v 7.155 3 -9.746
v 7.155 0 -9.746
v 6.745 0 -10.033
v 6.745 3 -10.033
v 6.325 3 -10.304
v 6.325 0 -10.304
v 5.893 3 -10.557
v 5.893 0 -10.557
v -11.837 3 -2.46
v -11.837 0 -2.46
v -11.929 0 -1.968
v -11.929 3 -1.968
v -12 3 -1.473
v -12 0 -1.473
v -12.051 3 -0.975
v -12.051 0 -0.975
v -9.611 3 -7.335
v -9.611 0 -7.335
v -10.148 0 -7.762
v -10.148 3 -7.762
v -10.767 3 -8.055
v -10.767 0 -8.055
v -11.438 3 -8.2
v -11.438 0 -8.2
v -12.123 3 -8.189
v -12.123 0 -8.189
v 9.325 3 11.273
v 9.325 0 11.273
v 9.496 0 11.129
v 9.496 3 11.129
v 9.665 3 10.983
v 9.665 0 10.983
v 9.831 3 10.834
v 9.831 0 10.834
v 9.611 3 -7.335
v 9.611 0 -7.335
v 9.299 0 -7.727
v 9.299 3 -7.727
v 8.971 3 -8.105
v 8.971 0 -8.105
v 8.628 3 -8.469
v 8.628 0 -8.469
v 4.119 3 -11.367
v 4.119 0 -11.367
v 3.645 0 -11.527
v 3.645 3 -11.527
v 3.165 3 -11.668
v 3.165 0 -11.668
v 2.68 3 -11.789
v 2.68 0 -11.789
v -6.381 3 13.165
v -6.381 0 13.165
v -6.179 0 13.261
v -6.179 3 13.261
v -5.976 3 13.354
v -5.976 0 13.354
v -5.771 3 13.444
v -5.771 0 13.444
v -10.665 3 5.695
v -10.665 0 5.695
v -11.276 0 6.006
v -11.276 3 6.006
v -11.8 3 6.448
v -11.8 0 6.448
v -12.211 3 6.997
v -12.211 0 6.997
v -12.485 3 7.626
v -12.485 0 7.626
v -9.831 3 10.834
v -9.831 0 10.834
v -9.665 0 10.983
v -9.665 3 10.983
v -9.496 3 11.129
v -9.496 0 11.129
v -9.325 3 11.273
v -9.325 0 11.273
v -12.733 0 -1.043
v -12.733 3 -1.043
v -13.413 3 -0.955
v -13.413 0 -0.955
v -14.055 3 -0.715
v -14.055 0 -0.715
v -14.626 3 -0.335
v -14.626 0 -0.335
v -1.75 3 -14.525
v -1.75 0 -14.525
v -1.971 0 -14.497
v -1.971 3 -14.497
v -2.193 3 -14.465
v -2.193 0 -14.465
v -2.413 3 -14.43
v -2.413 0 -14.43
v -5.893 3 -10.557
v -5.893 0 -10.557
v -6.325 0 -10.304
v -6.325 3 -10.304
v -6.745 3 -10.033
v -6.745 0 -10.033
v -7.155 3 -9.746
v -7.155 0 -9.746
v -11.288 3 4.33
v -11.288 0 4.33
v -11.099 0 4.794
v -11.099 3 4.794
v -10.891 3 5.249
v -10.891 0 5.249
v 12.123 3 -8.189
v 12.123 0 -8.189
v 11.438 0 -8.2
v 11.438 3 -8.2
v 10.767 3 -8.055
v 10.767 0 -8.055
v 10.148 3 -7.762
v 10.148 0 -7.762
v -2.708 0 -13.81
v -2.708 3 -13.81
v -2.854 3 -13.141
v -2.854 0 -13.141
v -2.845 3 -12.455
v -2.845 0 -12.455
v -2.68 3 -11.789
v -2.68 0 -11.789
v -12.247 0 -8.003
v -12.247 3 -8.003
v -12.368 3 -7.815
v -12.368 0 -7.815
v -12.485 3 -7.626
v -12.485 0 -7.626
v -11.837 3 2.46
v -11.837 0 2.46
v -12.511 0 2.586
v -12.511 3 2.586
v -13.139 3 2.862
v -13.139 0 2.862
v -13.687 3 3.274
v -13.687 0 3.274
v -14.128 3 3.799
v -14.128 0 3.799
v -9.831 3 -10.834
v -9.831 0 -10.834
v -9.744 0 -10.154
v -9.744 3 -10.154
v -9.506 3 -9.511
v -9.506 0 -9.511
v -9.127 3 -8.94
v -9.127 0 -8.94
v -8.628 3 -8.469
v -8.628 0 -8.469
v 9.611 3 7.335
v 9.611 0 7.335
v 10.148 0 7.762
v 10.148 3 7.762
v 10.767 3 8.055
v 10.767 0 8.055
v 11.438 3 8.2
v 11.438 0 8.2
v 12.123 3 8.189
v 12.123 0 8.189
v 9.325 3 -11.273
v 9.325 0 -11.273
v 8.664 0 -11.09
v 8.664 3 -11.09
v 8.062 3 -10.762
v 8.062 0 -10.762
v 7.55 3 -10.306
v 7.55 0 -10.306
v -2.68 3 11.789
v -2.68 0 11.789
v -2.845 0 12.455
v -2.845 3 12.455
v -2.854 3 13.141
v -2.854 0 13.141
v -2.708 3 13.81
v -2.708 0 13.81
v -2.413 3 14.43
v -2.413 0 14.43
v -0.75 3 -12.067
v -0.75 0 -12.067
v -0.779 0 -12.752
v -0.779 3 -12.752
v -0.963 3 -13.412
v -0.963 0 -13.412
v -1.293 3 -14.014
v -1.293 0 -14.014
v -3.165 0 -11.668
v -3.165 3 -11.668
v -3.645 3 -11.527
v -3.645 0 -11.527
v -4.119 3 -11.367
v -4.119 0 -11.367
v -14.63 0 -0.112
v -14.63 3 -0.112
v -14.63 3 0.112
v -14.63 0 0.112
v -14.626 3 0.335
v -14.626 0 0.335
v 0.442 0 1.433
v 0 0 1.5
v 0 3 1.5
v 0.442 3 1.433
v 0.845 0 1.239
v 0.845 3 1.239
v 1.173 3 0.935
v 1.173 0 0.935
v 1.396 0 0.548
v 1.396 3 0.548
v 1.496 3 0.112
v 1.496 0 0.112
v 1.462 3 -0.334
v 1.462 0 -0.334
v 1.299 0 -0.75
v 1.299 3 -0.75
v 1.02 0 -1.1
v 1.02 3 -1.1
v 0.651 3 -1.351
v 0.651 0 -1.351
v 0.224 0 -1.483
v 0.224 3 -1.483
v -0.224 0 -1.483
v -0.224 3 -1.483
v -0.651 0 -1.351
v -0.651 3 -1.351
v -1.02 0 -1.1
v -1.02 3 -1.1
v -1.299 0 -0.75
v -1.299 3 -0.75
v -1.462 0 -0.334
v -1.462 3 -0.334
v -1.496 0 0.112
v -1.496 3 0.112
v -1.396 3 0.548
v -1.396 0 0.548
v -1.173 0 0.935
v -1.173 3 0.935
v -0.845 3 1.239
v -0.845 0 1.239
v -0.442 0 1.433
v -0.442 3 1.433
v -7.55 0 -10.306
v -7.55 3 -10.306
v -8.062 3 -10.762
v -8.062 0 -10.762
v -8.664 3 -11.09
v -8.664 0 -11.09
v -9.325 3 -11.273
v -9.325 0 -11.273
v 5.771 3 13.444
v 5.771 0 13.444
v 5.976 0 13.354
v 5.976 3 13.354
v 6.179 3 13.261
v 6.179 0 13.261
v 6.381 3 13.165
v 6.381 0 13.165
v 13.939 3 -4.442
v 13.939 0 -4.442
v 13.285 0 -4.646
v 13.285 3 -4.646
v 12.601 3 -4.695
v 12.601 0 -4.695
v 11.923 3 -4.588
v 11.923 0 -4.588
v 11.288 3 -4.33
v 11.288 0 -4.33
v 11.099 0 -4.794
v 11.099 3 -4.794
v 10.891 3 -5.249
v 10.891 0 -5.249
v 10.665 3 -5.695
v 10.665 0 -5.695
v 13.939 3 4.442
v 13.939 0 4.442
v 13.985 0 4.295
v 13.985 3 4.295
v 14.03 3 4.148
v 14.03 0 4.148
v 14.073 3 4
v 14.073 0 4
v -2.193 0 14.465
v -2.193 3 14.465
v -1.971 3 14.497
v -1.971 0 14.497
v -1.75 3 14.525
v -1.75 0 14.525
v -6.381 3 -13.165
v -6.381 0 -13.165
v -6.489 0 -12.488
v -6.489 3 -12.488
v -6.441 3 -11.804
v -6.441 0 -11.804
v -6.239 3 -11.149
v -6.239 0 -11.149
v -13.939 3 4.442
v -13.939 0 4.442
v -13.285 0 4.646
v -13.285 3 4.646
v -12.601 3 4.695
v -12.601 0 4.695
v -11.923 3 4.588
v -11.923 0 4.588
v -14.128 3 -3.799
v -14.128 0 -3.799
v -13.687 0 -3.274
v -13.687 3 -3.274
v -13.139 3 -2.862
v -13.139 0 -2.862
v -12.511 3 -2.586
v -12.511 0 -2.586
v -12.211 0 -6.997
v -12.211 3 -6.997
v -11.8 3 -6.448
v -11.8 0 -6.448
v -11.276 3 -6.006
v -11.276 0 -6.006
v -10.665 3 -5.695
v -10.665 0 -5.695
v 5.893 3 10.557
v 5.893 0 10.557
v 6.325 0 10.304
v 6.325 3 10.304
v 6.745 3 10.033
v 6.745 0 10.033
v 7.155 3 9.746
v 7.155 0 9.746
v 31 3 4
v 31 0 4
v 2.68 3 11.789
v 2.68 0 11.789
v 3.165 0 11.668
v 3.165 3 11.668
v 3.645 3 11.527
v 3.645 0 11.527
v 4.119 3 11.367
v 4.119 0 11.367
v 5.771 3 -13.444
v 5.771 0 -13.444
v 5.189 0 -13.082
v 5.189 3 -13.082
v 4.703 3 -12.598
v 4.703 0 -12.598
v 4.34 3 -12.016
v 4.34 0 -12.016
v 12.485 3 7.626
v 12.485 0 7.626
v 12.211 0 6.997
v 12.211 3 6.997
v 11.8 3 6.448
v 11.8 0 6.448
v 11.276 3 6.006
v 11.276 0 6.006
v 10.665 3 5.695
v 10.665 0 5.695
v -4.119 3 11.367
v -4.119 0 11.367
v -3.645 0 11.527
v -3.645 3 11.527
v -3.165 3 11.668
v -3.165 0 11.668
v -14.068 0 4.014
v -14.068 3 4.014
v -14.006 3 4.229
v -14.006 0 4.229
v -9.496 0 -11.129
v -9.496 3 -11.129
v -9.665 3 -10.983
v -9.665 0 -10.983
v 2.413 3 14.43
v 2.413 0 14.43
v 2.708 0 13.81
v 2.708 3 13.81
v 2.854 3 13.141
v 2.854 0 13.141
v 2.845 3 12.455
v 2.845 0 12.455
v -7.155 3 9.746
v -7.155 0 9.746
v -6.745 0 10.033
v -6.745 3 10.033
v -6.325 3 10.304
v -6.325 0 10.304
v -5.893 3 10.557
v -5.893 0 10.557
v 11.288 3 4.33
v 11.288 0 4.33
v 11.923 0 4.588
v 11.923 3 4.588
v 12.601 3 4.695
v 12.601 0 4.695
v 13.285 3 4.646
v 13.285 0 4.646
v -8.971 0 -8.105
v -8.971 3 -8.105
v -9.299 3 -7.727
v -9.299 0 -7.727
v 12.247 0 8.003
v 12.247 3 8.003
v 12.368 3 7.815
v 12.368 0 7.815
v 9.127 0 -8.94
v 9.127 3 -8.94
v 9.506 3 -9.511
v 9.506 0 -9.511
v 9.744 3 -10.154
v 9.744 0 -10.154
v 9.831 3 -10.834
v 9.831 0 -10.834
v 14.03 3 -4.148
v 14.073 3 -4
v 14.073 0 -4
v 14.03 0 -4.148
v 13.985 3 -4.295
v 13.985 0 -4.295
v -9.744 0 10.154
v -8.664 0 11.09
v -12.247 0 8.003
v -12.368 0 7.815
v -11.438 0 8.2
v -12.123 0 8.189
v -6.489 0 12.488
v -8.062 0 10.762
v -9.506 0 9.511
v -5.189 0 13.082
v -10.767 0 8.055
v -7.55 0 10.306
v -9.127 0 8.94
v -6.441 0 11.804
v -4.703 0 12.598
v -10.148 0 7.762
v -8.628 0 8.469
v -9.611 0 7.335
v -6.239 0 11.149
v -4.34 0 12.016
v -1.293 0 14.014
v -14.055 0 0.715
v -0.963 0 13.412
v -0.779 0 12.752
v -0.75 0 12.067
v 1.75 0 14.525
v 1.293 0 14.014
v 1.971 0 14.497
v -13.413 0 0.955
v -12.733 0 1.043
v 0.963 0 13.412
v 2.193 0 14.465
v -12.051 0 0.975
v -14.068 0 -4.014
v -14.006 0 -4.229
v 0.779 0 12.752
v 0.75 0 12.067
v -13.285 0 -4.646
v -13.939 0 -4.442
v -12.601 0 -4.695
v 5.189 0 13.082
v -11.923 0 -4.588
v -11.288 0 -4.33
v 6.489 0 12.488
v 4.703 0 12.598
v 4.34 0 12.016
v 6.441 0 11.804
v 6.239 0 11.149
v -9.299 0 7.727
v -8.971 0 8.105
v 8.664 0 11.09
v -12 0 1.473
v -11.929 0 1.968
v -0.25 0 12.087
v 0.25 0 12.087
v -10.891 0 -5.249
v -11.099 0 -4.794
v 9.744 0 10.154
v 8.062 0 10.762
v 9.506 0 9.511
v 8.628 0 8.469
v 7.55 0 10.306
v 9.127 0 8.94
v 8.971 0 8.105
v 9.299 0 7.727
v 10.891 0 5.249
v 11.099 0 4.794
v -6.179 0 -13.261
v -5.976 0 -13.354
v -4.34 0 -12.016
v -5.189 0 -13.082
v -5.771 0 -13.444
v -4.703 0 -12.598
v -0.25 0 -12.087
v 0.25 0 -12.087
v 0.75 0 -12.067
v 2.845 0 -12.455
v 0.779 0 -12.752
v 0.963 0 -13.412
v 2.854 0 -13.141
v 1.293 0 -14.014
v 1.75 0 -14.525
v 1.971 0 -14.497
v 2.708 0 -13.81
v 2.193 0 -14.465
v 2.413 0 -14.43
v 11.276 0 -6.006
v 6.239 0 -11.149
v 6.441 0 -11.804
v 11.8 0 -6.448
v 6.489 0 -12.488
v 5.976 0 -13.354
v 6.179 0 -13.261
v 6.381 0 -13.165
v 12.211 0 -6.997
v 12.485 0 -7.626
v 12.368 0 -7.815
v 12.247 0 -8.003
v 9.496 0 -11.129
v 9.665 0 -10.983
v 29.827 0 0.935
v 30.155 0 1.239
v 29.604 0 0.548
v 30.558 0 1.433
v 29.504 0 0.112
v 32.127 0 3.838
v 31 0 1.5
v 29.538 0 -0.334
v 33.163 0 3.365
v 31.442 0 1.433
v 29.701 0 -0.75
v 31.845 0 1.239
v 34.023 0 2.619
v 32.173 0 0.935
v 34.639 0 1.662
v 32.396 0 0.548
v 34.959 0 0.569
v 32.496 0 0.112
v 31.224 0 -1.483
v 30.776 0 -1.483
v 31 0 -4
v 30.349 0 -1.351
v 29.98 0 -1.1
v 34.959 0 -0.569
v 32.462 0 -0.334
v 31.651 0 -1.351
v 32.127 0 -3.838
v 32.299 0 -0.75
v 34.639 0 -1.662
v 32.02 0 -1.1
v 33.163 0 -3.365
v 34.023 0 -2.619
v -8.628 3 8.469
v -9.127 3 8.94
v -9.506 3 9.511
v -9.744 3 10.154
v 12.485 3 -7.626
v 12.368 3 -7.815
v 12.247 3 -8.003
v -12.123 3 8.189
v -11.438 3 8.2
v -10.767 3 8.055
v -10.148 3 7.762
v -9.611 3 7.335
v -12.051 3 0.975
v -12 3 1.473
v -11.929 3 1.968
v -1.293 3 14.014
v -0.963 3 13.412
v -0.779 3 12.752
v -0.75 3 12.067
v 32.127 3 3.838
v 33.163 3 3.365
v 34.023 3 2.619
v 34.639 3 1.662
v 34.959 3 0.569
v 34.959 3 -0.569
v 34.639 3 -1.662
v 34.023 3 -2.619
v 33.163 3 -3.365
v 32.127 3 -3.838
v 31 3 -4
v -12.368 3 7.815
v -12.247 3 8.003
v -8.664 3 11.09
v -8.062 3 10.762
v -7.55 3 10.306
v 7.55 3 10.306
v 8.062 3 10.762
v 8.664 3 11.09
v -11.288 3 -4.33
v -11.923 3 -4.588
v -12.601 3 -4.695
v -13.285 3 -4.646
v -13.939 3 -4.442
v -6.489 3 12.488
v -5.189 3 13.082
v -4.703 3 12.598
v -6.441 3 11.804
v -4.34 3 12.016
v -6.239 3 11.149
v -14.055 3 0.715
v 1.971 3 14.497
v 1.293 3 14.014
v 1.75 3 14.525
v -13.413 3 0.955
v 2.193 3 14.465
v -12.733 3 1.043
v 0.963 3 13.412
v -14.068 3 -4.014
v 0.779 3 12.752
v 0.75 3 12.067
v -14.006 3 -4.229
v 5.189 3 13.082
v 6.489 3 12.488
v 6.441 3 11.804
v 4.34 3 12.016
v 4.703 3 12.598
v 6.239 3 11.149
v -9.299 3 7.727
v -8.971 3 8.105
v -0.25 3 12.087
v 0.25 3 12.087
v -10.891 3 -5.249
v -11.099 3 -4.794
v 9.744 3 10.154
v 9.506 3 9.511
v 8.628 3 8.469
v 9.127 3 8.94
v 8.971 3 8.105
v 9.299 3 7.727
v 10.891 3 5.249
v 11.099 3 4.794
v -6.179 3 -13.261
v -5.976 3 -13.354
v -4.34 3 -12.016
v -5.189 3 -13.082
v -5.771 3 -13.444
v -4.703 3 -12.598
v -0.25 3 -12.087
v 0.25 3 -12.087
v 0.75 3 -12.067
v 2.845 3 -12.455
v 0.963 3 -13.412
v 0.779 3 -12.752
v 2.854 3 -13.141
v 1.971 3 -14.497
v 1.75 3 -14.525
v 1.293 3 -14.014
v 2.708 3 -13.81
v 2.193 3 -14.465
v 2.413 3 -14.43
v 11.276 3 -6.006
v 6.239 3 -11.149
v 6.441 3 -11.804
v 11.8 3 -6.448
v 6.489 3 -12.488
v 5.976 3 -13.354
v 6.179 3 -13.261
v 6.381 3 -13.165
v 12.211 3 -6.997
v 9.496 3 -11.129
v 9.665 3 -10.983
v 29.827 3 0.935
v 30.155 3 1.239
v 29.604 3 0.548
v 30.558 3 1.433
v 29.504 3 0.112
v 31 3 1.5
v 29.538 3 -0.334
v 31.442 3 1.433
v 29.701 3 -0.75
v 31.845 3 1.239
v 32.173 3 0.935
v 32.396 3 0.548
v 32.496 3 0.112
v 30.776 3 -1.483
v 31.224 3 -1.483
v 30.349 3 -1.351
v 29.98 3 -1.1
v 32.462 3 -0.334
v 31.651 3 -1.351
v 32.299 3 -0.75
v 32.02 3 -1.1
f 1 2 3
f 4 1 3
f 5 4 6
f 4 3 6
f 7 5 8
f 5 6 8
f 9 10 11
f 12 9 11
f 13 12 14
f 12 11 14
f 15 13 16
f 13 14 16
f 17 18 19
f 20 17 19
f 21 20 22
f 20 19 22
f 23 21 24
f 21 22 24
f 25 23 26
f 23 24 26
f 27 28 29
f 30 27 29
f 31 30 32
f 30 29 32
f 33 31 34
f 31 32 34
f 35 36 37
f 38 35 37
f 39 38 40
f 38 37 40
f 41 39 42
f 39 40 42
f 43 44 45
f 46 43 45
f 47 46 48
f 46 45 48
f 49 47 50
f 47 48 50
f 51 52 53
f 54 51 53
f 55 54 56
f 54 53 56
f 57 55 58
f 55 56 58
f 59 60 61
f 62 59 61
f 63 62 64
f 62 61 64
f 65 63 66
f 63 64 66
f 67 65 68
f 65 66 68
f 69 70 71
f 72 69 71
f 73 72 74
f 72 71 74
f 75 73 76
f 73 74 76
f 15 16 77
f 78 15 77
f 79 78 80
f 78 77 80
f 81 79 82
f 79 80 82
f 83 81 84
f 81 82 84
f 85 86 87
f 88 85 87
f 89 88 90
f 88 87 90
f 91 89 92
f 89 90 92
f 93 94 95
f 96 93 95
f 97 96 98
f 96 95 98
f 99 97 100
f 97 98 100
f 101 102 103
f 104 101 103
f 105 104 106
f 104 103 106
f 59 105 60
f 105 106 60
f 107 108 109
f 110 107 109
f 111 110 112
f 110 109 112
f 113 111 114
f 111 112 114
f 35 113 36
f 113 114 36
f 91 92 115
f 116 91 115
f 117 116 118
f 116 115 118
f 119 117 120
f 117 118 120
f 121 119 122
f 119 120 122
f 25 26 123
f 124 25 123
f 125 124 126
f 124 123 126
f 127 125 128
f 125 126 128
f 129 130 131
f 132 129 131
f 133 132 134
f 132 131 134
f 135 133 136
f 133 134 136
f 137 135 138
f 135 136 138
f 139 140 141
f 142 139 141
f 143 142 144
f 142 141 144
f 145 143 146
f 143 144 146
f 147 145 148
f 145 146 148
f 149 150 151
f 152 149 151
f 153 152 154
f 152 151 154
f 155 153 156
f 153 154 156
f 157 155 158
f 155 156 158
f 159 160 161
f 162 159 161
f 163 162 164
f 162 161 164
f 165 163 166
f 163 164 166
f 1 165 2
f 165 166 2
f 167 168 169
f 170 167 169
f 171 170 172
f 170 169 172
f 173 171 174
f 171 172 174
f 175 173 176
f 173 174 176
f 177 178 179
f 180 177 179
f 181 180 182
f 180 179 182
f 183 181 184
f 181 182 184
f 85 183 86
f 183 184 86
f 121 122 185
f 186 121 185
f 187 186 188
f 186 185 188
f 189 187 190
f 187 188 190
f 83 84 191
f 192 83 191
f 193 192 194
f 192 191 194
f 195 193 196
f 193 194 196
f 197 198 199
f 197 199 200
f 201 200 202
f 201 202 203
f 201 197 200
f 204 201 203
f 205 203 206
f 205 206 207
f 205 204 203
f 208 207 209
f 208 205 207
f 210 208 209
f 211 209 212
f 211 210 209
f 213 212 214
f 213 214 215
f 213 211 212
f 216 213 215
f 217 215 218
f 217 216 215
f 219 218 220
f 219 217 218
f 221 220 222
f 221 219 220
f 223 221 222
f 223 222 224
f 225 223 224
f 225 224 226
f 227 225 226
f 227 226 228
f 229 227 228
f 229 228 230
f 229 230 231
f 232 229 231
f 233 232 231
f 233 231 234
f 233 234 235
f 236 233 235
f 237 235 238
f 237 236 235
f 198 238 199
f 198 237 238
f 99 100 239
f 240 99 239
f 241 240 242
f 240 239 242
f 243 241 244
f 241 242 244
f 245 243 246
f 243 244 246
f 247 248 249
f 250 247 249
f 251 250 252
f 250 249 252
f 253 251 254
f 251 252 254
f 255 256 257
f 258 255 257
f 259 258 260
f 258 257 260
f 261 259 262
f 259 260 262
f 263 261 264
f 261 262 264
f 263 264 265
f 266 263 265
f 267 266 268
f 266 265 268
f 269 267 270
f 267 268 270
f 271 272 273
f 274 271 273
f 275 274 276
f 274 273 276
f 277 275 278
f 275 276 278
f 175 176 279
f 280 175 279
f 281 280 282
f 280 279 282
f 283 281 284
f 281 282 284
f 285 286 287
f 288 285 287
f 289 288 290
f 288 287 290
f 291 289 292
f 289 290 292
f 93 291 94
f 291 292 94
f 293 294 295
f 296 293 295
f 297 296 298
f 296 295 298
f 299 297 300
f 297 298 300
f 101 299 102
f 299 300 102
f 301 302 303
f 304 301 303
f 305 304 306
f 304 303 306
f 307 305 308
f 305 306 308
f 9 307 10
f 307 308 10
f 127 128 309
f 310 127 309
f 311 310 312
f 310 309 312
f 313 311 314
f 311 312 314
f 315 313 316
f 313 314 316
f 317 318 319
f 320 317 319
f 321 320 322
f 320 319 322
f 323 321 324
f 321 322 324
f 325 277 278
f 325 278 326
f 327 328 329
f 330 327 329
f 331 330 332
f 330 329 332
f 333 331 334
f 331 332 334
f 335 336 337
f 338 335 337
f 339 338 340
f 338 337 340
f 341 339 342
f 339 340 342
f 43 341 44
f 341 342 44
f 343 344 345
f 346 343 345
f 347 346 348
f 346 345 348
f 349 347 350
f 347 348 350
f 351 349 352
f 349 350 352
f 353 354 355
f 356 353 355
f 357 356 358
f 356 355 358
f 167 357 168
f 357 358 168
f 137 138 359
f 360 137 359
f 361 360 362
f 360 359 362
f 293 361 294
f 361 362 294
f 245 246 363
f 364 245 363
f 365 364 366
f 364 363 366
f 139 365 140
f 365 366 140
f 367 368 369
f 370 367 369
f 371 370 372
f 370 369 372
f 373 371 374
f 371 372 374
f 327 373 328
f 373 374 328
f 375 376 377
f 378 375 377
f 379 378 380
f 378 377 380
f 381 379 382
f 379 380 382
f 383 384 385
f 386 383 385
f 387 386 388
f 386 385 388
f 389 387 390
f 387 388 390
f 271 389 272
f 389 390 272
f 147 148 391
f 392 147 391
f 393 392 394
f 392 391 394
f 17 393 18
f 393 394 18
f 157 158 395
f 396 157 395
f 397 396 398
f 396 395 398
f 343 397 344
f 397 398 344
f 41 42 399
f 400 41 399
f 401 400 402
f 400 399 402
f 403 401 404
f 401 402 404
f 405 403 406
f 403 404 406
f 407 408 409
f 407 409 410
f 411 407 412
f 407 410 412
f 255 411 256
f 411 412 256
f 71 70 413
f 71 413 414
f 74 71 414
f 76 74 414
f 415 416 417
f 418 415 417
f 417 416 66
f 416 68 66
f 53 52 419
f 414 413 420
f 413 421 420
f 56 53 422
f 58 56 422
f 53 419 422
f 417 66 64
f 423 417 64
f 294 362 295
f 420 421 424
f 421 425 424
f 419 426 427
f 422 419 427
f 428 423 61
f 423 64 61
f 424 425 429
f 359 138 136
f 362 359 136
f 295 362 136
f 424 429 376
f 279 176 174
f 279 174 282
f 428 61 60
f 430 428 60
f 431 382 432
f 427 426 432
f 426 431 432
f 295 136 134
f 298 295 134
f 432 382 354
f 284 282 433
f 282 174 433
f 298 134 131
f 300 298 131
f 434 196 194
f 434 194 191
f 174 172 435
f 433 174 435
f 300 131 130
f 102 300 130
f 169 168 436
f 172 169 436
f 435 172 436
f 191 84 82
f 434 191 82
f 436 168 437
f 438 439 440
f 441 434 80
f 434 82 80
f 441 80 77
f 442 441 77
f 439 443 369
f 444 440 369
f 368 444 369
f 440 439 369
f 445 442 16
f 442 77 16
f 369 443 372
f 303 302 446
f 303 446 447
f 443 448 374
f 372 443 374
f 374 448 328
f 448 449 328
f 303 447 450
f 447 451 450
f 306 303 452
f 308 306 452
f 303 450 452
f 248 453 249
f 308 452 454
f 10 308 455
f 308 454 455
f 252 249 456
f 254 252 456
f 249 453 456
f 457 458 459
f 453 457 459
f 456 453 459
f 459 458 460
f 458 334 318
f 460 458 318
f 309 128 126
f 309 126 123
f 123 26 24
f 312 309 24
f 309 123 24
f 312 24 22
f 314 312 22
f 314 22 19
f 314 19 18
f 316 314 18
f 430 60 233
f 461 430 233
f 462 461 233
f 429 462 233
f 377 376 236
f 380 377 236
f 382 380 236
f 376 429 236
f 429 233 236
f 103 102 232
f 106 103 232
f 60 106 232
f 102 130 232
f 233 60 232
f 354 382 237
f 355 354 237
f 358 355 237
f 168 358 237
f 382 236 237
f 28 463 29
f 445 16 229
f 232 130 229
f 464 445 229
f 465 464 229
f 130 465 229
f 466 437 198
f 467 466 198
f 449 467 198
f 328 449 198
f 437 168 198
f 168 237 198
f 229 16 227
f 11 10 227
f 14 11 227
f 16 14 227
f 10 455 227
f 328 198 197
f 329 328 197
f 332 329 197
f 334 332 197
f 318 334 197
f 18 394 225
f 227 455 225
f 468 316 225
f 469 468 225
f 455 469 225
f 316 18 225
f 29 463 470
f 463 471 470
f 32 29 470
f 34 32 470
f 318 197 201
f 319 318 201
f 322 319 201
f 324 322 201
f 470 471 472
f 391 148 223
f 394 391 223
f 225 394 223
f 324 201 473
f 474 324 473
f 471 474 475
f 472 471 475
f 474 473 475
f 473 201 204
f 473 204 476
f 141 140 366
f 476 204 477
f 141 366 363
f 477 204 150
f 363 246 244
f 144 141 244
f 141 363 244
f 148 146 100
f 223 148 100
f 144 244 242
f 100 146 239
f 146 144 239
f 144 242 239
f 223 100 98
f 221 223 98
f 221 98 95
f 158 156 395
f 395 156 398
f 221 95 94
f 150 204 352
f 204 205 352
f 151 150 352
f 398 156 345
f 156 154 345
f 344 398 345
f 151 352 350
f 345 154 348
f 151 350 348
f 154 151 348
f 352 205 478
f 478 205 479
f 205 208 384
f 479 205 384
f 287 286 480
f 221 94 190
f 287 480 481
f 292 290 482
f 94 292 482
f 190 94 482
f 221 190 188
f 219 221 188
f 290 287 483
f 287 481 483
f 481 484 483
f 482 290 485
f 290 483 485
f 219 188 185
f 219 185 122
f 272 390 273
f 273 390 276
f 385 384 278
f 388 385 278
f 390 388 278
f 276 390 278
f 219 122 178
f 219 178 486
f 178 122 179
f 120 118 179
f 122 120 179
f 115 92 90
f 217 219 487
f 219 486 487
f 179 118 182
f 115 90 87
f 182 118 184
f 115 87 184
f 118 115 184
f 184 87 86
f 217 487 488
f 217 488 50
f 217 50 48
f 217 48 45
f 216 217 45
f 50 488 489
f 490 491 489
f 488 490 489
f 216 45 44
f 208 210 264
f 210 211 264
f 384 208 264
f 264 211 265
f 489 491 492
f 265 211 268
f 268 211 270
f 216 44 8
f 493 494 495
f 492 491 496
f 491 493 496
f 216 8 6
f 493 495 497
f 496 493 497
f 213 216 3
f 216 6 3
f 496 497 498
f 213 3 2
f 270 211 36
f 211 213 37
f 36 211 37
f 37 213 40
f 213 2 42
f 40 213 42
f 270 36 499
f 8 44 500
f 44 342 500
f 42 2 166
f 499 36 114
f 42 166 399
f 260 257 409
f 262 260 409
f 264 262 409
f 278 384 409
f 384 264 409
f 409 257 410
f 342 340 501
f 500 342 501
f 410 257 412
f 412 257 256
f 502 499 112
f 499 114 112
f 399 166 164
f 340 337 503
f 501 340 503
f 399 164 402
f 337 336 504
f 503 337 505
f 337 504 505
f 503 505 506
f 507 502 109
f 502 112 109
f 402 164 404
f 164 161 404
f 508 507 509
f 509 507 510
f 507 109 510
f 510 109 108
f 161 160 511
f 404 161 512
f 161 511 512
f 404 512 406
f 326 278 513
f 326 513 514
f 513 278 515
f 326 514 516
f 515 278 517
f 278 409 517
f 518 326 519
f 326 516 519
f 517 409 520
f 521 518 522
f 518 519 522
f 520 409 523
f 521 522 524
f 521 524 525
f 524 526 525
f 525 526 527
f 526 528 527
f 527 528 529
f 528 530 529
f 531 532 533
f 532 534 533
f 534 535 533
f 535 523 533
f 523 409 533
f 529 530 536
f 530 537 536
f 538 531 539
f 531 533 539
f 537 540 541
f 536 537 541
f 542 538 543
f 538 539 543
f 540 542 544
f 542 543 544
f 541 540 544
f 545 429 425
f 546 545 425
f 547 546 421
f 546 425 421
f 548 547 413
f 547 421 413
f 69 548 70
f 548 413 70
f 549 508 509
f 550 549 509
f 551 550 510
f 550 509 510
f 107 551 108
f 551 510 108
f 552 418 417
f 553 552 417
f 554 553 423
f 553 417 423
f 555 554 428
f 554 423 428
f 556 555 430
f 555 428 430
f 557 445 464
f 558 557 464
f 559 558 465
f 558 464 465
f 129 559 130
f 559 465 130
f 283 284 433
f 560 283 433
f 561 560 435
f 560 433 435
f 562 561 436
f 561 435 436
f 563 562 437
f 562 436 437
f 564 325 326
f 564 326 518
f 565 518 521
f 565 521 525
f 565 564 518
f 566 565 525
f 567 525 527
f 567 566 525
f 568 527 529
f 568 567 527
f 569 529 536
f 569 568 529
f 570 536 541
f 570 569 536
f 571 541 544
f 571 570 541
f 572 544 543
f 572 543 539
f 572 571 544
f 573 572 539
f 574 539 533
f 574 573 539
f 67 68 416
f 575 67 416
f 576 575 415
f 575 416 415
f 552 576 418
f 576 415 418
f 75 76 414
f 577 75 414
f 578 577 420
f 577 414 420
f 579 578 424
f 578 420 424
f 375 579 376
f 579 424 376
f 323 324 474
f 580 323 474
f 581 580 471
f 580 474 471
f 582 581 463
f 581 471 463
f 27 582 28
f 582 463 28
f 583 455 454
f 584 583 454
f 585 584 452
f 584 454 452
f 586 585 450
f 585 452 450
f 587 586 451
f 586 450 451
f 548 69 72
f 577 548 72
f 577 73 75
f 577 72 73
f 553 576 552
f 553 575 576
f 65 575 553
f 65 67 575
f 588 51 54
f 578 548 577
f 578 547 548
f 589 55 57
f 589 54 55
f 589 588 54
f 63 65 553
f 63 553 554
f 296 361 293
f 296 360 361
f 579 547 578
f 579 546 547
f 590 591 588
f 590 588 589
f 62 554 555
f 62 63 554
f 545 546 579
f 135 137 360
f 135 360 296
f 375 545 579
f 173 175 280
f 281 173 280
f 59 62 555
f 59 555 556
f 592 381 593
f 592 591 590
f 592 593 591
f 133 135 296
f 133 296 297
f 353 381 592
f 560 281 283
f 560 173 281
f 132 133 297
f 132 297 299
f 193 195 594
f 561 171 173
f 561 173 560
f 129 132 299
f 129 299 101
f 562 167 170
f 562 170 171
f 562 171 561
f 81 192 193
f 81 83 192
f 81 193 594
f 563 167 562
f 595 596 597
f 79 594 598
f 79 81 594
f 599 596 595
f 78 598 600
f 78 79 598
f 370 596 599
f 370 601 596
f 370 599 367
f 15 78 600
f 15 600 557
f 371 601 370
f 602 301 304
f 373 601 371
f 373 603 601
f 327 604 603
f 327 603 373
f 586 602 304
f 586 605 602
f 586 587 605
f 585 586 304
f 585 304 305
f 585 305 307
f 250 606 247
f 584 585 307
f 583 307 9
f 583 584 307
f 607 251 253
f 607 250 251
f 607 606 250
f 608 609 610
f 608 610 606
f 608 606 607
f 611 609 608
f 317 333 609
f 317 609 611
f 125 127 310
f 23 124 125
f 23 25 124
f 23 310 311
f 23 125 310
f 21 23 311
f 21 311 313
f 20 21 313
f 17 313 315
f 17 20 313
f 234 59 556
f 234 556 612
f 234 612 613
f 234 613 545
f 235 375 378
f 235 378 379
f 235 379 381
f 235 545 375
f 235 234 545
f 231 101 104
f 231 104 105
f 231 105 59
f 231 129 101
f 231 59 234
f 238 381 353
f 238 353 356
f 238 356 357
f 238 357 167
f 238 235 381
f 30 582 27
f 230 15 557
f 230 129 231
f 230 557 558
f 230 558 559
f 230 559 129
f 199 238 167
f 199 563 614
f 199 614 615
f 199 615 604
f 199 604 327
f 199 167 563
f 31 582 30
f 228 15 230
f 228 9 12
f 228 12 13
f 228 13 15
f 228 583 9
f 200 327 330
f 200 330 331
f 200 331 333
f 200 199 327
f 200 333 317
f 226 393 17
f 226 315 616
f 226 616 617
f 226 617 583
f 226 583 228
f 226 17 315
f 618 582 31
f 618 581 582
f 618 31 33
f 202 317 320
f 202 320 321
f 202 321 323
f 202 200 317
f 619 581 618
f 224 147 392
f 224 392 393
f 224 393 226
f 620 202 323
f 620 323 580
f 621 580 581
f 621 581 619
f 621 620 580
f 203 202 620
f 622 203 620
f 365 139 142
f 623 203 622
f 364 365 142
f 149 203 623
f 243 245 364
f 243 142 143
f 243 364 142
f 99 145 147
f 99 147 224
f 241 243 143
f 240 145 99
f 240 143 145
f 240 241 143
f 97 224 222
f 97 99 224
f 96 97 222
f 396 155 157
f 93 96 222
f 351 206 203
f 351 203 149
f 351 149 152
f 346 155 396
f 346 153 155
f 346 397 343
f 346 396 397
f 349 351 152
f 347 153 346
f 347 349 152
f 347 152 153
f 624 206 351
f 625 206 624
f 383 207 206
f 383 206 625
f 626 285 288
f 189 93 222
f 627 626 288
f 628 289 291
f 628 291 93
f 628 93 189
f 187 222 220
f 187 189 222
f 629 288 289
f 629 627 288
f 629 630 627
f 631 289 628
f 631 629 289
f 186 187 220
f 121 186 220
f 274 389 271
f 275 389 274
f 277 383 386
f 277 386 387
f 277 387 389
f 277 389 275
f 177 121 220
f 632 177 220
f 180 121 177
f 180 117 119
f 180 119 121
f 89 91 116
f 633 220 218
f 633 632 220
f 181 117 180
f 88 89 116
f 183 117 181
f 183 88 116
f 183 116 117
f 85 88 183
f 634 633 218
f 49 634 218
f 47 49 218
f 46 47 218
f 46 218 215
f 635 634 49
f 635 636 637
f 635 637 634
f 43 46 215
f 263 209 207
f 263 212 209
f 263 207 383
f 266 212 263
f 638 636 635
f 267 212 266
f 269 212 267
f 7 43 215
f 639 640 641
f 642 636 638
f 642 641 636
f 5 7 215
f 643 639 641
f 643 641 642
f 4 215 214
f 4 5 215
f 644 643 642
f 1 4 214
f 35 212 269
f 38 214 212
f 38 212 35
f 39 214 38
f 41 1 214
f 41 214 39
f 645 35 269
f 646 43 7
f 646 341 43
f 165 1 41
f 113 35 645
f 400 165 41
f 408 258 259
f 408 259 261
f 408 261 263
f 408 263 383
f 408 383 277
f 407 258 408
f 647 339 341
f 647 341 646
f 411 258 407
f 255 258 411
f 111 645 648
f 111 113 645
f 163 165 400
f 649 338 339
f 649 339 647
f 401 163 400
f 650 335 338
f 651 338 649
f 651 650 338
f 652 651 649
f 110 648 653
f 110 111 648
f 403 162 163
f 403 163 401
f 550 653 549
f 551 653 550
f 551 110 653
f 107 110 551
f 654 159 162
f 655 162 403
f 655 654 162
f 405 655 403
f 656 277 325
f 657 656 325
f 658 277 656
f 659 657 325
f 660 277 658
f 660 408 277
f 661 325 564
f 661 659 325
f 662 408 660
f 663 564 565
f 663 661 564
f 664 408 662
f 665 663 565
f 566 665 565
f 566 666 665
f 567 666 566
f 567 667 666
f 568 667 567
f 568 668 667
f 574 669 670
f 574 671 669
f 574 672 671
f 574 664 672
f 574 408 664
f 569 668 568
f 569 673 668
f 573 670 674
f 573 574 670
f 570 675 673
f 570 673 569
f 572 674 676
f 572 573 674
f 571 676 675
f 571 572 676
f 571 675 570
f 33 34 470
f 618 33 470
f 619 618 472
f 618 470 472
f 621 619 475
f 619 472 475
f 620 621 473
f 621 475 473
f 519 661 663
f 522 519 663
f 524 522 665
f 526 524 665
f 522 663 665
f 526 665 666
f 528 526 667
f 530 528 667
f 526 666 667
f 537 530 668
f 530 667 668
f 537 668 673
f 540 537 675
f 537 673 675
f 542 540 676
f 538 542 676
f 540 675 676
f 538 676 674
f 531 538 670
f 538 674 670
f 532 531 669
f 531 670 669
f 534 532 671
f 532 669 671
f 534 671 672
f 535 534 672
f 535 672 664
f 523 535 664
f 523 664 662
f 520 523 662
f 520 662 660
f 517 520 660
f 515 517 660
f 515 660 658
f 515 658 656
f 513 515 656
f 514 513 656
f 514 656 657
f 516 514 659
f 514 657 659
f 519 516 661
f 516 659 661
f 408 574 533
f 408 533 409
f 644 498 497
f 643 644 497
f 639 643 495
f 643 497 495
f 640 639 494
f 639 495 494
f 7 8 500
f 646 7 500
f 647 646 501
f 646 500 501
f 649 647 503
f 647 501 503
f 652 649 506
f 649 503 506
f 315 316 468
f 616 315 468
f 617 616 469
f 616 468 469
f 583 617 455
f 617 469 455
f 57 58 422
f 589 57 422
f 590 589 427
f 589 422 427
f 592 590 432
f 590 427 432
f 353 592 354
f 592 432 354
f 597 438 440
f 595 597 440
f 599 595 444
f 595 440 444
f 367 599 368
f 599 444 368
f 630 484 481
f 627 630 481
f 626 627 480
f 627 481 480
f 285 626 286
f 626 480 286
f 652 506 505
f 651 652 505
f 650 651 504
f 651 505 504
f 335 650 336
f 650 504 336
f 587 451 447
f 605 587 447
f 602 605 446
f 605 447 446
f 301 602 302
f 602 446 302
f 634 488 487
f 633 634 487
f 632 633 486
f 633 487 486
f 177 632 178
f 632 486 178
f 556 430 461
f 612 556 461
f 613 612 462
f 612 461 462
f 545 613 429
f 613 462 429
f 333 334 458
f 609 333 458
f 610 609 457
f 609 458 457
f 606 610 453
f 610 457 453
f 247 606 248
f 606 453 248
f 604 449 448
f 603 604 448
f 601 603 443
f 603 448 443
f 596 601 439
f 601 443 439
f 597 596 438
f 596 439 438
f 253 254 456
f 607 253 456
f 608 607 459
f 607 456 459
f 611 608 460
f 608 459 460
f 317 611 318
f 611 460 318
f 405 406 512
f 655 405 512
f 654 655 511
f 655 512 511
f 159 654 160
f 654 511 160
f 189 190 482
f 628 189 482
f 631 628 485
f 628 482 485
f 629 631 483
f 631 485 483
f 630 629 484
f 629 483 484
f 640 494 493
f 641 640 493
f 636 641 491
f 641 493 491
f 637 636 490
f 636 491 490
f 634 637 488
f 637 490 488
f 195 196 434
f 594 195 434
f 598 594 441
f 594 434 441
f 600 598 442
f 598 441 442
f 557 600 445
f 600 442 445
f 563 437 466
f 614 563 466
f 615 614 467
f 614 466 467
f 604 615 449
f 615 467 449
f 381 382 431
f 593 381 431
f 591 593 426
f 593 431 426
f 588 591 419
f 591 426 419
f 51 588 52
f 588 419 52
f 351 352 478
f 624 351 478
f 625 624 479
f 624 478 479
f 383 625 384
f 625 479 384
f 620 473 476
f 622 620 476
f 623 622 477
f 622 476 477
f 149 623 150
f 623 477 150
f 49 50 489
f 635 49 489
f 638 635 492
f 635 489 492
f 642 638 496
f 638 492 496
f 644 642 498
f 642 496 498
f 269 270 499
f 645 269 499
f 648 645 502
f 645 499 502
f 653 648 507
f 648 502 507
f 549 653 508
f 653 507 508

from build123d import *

# Parameters (mm, degrees)
IZIM2_R                     = 14.63
IZIM2_R_2                   = 1.5
Y_KSEKLIK_EKSTR_ZYON1_DEPTH = 3
KES_EKSTR_ZYON1_START       = -3
KES_EKSTR_ZYON1_DEPTH       = 3
DAIRESEL_KAPLAMA1_COUNT     = 22
IZIM4_R                     = 1.5
Y_KSEKLIK_EKSTR_ZYON2_DEPTH = 3


with BuildPart() as part:
    # Çizim2 → Yükseklik-Ekstrüzyon1 (new body)
    with BuildSketch(Plane(origin=(0, 0, 0), x_dir=(1, 0, 0), z_dir=(0, 1, 0))):
        with Locations(Location((0, 0, 0), (0, 0, 270))):
            Circle(IZIM2_R)
        with Locations(Location((0, 0, 0), (0, 0, 270))):
            Circle(IZIM2_R_2, mode=Mode.SUBTRACT)
    extrude(amount=Y_KSEKLIK_EKSTR_ZYON1_DEPTH)

    # Çizim3 → Kes-Ekstrüzyon1 (cut)
    with BuildSketch(Plane(origin=(0, 3, 0), x_dir=(1, 0, 0), z_dir=(0, 1, 0)).offset(KES_EKSTR_ZYON1_START)):
        with BuildLine():
            ThreePointArc((0.75, 12.066714549), (0, 12.09), (-0.75, 12.066714549))
            ThreePointArc((-0.75, 12.066714549), (-0.963393925, 13.412425983), (-1.75, 14.524957831))
            ThreePointArc((-1.75, 14.524957831), (0, 14.63), (1.75, 14.524957831))
            ThreePointArc((1.75, 14.524957831), (0.963393925, 13.412425983), (0.75, 12.066714549))
        make_face()
    kes_ekstr_zyon1 = extrude(amount=KES_EKSTR_ZYON1_DEPTH, mode=Mode.SUBTRACT)

    # Dairesel Kaplama1: Kes-Ekstrüzyon1 ×22 about axis
    dairesel_kaplama1_axis = Axis((0, 0, 0), (0, 1, 0))
    for i in range(1, DAIRESEL_KAPLAMA1_COUNT):
        add(kes_ekstr_zyon1.rotate(dairesel_kaplama1_axis, i * 360 / DAIRESEL_KAPLAMA1_COUNT), mode=Mode.SUBTRACT)

    # Çizim4 → Yükseklik-Ekstrüzyon2 (add)
    with BuildSketch(Plane(origin=(0, 3, 0), x_dir=(1, 0, 0), z_dir=(0, 1, 0))):
        with BuildLine():
            Line((31, 4), (4.554699728, 4))
            Line((4.554699728, 4), (4.554699728, -4))
            Line((4.554699728, -4), (31, -4))
            ThreePointArc((31, -4), (35, 0), (31, 4))
        make_face()
        with Locations(Location((31, 0, 0), (0, 0, 270))):
            Circle(IZIM4_R, mode=Mode.SUBTRACT)
    extrude(amount=-Y_KSEKLIK_EKSTR_ZYON2_DEPTH)


solid = part.part
